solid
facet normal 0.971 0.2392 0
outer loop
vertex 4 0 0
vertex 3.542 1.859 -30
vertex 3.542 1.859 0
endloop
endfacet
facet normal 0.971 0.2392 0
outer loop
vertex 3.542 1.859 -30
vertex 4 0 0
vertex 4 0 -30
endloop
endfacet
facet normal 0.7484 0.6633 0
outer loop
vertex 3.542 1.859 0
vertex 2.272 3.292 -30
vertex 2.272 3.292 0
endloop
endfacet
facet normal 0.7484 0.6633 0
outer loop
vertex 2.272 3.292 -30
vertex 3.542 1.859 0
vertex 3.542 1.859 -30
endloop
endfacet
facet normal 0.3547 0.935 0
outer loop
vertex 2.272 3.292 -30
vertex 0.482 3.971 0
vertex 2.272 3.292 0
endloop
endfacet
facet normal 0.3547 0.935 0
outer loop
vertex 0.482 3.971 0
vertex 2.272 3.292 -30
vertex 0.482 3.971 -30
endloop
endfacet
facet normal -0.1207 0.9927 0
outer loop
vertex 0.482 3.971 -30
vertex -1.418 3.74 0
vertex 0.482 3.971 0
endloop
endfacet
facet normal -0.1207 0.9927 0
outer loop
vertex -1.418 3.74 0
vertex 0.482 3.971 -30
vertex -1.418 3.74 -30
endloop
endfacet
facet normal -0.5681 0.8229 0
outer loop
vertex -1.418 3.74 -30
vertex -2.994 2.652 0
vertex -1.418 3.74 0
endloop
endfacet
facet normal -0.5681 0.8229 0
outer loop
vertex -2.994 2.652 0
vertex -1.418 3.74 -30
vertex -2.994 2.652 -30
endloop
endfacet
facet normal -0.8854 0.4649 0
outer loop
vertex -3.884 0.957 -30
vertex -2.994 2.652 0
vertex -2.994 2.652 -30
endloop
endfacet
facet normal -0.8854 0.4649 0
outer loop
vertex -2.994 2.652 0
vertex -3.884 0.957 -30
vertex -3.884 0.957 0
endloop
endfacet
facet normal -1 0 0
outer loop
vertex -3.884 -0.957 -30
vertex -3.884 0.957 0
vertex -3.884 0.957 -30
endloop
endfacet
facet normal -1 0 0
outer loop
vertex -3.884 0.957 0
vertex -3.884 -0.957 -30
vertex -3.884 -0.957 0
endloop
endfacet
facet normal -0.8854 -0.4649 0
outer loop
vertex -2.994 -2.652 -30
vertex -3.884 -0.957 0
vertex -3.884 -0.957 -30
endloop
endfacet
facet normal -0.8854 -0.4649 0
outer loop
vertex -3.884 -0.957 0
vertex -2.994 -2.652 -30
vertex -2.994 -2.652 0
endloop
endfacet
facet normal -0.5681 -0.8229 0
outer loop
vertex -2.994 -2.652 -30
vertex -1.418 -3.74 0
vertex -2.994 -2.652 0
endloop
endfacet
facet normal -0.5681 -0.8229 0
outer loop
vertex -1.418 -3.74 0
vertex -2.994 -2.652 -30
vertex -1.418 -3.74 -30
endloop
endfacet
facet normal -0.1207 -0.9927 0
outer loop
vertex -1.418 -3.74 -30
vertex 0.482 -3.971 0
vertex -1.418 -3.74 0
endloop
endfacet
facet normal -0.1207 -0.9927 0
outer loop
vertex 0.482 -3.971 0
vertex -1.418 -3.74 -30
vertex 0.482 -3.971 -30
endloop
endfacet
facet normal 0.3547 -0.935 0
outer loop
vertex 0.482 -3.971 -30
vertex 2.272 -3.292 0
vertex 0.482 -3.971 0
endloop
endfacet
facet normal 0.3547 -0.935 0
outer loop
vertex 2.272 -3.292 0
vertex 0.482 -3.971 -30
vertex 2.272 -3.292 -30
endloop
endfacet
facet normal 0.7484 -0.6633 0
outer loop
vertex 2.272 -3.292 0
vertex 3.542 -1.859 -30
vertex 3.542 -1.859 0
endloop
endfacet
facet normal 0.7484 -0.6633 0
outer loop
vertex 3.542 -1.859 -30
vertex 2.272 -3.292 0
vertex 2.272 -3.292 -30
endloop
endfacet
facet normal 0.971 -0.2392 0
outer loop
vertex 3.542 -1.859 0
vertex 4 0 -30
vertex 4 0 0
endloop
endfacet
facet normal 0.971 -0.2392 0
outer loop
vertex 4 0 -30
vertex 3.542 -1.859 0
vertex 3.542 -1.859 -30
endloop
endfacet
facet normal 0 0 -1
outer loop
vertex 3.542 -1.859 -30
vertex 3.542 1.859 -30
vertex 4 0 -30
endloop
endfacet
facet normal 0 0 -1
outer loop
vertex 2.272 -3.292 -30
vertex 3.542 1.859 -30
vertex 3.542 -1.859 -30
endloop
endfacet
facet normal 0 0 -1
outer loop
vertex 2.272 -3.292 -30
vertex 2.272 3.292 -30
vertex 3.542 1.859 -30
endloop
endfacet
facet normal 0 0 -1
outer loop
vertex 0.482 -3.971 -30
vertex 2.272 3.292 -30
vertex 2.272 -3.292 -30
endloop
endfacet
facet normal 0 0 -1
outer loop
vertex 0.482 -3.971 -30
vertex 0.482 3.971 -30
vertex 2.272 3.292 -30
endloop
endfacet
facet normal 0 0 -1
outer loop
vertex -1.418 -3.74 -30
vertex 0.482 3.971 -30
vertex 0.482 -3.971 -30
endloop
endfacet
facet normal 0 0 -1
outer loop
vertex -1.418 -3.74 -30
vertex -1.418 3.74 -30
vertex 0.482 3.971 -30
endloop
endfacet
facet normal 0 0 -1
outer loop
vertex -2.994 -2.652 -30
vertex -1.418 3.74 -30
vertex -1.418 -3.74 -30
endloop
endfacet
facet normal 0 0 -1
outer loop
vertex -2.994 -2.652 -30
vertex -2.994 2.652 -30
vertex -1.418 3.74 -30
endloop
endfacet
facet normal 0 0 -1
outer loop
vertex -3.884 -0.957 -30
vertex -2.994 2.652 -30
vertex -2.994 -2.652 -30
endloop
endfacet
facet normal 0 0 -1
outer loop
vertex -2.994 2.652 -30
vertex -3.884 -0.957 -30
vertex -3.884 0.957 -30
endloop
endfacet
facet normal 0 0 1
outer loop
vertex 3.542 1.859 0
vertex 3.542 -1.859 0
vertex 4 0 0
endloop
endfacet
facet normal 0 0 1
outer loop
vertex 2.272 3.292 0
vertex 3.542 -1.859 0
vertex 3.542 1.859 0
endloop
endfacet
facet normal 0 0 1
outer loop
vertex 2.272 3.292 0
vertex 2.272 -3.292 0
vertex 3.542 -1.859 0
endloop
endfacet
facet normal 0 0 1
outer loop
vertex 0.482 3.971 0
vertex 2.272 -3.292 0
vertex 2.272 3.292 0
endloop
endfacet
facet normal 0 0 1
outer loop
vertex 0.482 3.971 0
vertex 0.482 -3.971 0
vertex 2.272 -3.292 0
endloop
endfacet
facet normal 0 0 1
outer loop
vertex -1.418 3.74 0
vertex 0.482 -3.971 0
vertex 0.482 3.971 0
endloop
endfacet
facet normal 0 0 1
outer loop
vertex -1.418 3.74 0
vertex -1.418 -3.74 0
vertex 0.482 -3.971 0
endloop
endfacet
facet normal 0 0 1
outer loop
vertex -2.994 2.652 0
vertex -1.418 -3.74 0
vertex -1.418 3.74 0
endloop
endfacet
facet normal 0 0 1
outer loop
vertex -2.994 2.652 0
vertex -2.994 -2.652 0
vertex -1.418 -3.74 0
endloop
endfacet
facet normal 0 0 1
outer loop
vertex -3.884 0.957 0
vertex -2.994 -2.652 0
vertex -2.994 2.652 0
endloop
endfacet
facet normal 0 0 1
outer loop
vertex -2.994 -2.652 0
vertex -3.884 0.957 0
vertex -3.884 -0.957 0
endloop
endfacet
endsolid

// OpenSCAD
// M8 hex bolt (threads omitted)
AF = 13;   // head across-flats
HH = 5.3;  // head height
SD = 8;    // shank diameter
SL = 30;   // shank length

// Hex head: z=0 .. z=HH
linear_extrude(height = HH)
  polygon(sides = 6, radius = AF / sqrt(3));

// Shank: z=-SL .. z=0
translate([0, 0, -SL])
  cylinder(h = SL, d = SD);
